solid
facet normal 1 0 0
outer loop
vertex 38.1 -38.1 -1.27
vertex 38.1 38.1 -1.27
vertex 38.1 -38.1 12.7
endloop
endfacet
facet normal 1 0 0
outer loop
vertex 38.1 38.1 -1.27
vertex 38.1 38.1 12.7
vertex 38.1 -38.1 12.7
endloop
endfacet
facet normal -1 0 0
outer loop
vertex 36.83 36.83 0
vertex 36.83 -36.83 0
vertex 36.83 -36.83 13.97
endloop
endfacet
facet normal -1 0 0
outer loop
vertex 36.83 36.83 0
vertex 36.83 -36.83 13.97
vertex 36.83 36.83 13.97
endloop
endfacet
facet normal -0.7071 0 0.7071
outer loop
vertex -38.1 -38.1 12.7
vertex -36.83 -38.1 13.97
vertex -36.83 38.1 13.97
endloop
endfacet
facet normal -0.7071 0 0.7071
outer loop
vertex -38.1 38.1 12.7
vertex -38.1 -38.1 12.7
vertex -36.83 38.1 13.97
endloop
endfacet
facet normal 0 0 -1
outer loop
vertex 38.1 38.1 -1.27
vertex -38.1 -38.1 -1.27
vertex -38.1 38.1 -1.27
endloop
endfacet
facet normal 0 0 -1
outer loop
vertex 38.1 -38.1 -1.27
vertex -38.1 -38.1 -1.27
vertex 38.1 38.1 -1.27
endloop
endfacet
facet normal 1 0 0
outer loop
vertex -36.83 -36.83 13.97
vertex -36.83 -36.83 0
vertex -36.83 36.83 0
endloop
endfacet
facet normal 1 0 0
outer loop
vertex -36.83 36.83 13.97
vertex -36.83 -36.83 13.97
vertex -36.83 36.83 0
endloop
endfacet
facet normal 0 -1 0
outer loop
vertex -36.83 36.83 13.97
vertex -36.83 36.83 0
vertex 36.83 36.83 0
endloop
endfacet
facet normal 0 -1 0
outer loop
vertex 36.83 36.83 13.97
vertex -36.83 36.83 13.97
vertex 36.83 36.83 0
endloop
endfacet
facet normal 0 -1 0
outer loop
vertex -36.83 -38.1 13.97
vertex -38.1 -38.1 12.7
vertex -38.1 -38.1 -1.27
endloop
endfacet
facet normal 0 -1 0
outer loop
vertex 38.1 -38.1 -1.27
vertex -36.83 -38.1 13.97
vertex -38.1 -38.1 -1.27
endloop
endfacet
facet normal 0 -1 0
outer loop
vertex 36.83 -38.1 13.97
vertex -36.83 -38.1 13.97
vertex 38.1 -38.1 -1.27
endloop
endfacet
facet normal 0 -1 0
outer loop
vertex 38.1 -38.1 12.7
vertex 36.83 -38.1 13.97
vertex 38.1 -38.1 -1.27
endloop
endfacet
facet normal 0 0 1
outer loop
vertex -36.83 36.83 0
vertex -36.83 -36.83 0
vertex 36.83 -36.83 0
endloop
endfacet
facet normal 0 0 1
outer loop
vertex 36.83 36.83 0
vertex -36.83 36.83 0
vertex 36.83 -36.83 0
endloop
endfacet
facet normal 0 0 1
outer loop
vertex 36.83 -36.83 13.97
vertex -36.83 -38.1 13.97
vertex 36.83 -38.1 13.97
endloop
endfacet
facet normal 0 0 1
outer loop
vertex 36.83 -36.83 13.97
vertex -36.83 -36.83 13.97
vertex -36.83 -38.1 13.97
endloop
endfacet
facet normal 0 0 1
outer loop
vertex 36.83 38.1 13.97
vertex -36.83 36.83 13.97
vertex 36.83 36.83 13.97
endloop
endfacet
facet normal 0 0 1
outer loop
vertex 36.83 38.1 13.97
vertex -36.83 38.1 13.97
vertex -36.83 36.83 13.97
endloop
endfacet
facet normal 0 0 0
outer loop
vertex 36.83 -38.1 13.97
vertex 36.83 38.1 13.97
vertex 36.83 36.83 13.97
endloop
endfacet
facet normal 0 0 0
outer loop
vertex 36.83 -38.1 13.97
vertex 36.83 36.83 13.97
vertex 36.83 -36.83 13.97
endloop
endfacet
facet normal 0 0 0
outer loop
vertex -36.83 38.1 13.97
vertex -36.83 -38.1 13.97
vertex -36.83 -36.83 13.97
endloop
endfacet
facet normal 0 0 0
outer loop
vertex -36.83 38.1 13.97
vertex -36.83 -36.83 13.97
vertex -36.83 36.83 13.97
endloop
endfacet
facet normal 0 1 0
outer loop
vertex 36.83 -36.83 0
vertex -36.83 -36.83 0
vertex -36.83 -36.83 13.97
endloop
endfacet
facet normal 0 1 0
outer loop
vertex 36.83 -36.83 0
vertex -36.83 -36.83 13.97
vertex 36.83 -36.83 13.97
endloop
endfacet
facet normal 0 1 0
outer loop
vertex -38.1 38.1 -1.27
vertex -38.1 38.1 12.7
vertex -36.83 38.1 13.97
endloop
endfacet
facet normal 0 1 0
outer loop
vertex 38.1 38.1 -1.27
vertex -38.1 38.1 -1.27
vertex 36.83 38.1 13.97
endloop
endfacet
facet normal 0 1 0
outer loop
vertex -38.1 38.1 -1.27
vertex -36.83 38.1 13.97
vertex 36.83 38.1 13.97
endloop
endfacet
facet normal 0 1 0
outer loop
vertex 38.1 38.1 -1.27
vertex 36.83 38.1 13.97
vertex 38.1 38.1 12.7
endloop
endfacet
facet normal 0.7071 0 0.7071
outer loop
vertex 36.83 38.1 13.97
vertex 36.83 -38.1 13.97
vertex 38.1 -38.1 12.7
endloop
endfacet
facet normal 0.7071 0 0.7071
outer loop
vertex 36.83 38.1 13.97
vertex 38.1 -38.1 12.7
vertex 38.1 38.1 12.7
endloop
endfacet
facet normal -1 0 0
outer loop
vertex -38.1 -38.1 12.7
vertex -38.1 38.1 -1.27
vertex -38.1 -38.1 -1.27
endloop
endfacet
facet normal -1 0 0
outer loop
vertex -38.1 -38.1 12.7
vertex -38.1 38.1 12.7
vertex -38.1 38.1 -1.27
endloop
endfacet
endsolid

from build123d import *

# Parameters (mm, degrees)
F0_W     = 76.2
F0_H     = 76.2
F0_W_2   = 73.66
F0_H_2   = 73.66
F1_DEPTH = 13.97
F2_SIZE  = 1.26999
F3_W     = 76.2
F3_H     = 76.2
F4_DEPTH = 1.27


# Not quite as in the source:
# - a fillet or chamfer is up to 0.001 mm smaller than in the source, because OpenCascade refuses the exact size


with BuildPart() as f1:
    # F0 (on Top) → F1 (new body)
    with BuildSketch(Plane.XY):
        Rectangle(F0_W, F0_H)
        Rectangle(F0_W_2, F0_H_2, mode=Mode.SUBTRACT)
    extrude(amount=F1_DEPTH)

    # F2 (size 1.27 in the source; OpenCascade refuses exactly that, so slightly less here)
    f2_edges = [f1.edges().sort_by_distance(p)[0] for p in [
        (-38.1, 0, 13.97),
        (38.1, 0, 13.97),
    ]]
    chamfer(f2_edges, length=F2_SIZE)

    # F3 (on face) → F4 (join)
    with BuildSketch(Plane(origin=(0, 0, 0), x_dir=(1, 0, 0), z_dir=(0, 0, -1))):
        Rectangle(F3_W, F3_H)
    extrude(amount=F4_DEPTH)


solid = f1.part
